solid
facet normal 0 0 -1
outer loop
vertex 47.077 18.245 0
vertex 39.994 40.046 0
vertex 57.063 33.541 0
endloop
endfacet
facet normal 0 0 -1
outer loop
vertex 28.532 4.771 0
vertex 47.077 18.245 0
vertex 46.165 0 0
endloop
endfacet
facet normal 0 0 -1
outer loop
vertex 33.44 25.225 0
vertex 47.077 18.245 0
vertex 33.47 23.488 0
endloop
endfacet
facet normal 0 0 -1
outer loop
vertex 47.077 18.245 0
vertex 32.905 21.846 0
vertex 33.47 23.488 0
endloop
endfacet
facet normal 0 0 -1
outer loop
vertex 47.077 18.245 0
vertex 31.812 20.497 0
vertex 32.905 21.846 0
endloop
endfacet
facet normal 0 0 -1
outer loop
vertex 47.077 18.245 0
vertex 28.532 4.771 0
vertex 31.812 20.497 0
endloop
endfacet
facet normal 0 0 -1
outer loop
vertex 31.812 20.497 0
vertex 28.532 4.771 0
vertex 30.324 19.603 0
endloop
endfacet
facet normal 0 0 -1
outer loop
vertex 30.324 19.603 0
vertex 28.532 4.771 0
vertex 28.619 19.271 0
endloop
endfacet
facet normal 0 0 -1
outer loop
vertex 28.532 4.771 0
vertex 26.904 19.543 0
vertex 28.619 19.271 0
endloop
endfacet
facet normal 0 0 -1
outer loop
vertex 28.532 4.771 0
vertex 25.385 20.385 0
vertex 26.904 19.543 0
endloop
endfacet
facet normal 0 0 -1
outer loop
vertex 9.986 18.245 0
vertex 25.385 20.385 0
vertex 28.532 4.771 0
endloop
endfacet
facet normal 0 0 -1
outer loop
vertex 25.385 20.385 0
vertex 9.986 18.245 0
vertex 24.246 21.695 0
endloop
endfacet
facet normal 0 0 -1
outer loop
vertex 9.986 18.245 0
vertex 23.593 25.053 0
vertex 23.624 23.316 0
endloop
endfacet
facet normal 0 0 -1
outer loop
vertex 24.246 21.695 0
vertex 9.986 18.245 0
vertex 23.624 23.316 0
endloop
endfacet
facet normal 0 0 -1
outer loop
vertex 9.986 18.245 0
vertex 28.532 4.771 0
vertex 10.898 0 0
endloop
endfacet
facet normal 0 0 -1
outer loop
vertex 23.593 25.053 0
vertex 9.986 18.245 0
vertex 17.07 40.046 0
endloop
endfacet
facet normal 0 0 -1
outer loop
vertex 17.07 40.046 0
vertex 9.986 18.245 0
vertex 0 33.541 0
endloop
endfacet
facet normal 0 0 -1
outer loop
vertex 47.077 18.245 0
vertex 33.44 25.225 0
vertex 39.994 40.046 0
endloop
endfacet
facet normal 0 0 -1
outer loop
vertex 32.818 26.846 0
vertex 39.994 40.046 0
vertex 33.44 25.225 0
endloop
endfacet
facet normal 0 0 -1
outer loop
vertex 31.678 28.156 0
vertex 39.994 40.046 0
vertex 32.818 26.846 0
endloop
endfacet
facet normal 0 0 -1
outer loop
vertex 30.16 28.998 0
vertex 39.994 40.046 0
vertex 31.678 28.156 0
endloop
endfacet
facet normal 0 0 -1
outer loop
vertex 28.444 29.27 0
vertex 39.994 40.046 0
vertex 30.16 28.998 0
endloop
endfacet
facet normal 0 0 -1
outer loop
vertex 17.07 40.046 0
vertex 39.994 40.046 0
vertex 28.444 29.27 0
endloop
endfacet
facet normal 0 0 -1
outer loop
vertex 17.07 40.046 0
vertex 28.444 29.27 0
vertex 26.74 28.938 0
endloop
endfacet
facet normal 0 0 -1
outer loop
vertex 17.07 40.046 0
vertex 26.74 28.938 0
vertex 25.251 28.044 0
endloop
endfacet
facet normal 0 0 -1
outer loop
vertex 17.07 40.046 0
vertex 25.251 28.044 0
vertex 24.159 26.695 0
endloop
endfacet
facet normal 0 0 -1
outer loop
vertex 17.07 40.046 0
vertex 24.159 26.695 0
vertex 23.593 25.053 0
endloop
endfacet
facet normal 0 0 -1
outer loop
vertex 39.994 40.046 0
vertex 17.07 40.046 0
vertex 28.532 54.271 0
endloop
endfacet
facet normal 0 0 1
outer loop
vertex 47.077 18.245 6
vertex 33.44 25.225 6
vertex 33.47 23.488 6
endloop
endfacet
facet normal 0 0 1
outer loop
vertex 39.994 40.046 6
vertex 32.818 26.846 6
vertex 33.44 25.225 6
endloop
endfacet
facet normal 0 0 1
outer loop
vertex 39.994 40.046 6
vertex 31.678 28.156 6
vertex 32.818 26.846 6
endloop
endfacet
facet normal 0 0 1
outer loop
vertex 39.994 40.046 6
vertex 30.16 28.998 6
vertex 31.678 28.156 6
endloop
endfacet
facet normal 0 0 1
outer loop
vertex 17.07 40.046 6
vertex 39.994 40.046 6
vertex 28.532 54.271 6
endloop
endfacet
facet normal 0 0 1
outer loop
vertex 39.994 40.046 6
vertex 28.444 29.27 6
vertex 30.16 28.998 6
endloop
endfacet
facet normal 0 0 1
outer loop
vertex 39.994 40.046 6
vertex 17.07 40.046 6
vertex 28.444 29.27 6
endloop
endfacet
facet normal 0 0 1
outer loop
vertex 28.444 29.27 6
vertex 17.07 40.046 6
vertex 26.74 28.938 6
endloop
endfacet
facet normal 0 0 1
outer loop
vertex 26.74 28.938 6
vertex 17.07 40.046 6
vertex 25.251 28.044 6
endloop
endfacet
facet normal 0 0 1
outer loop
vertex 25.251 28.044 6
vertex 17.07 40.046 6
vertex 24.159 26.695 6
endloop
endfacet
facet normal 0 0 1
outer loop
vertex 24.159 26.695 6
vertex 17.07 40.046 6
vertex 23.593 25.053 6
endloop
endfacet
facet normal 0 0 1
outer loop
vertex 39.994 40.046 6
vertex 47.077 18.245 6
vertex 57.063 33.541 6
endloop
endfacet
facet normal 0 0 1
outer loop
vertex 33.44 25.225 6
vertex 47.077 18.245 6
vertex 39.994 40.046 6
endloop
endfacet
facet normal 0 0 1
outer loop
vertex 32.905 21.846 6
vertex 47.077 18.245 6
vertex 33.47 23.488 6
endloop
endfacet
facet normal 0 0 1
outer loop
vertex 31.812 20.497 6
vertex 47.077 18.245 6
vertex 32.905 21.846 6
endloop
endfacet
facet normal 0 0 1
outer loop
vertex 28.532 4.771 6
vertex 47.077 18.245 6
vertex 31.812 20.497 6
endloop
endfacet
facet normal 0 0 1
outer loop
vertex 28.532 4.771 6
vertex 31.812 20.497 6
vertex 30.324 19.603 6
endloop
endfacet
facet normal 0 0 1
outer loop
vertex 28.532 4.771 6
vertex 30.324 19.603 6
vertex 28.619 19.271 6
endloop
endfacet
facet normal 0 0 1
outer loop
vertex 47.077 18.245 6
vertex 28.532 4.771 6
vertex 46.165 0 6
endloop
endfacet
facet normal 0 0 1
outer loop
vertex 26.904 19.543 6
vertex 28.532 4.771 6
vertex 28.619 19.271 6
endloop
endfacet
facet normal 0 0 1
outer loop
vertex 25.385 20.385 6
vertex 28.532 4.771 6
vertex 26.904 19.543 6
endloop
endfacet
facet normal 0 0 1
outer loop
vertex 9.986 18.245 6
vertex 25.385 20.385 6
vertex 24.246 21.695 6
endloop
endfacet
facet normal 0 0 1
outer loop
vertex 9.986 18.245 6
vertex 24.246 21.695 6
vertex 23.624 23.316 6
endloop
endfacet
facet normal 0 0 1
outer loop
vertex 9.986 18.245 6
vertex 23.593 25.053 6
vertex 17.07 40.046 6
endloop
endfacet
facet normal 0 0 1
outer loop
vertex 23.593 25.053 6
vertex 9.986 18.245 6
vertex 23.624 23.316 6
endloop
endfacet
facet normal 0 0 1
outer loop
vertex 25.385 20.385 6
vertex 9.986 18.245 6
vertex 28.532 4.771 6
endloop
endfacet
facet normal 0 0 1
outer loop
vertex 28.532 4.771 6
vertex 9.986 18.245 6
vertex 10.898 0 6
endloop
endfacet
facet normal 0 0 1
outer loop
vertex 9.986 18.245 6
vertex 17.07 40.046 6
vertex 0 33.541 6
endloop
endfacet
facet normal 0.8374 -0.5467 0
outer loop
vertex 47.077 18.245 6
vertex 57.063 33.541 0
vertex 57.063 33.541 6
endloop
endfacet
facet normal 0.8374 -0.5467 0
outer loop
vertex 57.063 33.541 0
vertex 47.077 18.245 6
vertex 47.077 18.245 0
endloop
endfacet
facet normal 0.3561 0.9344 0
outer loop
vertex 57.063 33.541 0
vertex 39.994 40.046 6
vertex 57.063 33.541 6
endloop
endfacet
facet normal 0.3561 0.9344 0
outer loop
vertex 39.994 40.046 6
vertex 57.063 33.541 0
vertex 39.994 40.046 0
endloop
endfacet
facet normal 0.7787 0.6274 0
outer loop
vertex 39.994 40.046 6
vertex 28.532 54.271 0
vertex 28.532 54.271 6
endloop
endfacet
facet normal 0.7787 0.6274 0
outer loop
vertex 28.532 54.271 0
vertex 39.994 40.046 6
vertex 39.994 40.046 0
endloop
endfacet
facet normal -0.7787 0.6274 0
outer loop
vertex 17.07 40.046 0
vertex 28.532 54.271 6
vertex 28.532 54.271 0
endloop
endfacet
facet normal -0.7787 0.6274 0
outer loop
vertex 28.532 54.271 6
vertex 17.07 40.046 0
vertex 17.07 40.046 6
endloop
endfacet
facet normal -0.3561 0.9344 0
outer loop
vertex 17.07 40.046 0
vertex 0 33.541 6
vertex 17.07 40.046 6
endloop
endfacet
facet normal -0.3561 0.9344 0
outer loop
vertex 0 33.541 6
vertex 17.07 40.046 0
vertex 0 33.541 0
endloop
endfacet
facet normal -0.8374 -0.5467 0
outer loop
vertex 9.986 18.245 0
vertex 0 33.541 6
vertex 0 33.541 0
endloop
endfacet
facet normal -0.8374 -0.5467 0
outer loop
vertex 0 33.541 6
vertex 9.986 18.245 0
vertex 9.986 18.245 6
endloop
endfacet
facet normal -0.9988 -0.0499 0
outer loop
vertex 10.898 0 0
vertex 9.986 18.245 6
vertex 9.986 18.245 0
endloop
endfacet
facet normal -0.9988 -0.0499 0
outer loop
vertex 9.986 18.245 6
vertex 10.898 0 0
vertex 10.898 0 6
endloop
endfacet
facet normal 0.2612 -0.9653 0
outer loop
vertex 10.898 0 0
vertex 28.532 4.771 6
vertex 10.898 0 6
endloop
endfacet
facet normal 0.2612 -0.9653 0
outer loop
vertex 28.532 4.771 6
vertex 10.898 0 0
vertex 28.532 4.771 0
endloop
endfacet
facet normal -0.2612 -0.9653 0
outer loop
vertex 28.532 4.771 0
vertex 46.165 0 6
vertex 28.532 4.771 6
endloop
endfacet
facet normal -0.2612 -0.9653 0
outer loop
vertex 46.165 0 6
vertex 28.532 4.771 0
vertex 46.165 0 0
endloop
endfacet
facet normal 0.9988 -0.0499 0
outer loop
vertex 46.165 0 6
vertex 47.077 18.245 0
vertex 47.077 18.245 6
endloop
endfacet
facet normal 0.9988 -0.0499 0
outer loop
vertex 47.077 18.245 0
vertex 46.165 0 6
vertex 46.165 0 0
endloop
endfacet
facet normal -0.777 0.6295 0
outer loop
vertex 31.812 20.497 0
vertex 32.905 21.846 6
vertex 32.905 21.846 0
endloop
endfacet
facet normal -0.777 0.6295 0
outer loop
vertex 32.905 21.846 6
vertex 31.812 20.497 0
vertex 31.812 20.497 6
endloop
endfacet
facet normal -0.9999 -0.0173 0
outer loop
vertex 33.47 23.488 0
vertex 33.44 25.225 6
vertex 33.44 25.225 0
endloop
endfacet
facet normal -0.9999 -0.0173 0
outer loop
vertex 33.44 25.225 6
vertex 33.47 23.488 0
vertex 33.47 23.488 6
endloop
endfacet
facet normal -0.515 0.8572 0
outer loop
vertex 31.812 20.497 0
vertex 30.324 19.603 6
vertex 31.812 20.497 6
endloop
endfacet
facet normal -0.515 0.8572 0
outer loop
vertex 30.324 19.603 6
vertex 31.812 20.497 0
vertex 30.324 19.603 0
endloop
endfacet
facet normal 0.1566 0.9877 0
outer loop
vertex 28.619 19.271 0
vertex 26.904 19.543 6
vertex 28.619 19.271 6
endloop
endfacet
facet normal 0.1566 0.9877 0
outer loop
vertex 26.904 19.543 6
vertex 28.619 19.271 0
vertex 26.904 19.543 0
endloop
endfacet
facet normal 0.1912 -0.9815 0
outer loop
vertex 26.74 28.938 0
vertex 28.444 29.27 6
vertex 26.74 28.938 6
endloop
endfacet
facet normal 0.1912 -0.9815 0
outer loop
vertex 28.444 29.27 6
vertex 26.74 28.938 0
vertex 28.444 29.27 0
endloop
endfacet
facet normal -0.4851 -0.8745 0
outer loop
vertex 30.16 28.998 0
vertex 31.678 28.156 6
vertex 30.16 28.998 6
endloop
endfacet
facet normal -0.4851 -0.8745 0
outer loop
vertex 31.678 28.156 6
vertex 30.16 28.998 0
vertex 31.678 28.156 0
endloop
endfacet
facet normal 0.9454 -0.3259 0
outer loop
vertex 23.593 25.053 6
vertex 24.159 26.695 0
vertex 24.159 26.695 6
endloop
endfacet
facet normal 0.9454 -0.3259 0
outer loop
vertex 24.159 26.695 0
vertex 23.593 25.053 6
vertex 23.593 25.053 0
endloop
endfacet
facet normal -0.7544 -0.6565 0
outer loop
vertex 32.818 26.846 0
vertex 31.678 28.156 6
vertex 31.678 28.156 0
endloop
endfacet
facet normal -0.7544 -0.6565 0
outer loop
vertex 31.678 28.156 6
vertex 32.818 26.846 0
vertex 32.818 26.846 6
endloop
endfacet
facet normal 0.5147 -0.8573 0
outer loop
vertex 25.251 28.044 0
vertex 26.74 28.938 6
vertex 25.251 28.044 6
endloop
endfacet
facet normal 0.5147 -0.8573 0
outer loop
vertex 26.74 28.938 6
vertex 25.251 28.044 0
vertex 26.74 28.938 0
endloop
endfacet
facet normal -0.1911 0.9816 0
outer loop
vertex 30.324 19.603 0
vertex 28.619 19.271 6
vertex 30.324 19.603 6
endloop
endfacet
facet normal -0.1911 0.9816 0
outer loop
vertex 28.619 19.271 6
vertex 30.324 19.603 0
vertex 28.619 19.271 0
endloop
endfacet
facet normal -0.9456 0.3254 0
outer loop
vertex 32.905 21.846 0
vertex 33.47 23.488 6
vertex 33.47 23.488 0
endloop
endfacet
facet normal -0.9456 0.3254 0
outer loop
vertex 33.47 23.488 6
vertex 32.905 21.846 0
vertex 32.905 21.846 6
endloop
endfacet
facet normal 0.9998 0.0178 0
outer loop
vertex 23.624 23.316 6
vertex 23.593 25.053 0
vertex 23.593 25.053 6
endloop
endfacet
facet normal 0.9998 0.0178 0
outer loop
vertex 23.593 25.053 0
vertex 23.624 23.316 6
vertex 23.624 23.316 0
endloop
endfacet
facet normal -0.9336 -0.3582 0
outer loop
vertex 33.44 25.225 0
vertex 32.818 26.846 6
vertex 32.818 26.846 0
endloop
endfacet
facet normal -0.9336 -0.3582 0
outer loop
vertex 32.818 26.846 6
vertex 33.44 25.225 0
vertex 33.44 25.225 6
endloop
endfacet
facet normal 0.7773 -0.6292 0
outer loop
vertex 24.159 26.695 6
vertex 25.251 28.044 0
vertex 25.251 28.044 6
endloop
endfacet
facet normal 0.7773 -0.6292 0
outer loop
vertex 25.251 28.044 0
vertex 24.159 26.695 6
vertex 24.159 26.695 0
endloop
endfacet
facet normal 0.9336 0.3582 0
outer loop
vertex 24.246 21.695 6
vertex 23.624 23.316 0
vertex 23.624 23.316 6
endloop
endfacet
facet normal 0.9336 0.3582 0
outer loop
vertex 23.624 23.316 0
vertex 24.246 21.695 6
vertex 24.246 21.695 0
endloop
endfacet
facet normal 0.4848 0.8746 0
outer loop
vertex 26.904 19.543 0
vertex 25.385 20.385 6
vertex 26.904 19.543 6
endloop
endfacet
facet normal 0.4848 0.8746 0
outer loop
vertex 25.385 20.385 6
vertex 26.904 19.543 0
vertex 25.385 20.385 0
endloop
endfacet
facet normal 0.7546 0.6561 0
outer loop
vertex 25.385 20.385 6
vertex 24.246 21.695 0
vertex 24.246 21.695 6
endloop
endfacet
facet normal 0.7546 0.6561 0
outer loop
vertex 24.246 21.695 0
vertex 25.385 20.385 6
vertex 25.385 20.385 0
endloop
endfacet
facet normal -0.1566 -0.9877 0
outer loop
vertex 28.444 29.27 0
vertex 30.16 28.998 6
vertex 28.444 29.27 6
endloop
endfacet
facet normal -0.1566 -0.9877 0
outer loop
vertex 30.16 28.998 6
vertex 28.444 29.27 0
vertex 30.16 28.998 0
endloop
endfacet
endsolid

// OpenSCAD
$fn = 32;

// ----------------------------------------------------------------------
// Star wheel: 5-point blunt, R30
// ----------------------------------------------------------------------

// --- parameters (mm) ---
n_points = 5;             // number of points / teeth
r_out = 30;               // tip radius
r_in = 19.5;              // root radius
bore_r = 5;               // centre bore radius
plate_t = 6;              // plate thickness, Z (extrusion height)
bore_d = 10;              // centre bore diameter

profile = [[28.532, 54.271], [17.07, 40.046], [0, 33.541], [9.986, 18.245], [10.898, 0], [28.532, 4.771], [46.165, 0], [47.077, 18.245], [57.063, 33.541], [39.994, 40.046]];  // primary outline, 10 points, counter clockwise
void_1 = [[33.44, 25.225], [32.818, 26.846], [31.678, 28.156], [30.16, 28.998], [28.444, 29.27], [26.74, 28.938], [25.251, 28.044], [24.159, 26.695], [23.593, 25.053], [23.624, 23.316], [24.246, 21.695], [25.385, 20.385], [26.904, 19.543], [28.619, 19.271], [30.324, 19.603], [31.812, 20.497], [32.905, 21.846], [33.47, 23.488]];  // centre bore, 18 points

// --- the one profile operation ---
difference() {
  linear_extrude(height = plate_t) polygon(points = profile);
  translate([0, 0, -1])
    linear_extrude(height = plate_t + 2) polygon(points = void_1);
}
